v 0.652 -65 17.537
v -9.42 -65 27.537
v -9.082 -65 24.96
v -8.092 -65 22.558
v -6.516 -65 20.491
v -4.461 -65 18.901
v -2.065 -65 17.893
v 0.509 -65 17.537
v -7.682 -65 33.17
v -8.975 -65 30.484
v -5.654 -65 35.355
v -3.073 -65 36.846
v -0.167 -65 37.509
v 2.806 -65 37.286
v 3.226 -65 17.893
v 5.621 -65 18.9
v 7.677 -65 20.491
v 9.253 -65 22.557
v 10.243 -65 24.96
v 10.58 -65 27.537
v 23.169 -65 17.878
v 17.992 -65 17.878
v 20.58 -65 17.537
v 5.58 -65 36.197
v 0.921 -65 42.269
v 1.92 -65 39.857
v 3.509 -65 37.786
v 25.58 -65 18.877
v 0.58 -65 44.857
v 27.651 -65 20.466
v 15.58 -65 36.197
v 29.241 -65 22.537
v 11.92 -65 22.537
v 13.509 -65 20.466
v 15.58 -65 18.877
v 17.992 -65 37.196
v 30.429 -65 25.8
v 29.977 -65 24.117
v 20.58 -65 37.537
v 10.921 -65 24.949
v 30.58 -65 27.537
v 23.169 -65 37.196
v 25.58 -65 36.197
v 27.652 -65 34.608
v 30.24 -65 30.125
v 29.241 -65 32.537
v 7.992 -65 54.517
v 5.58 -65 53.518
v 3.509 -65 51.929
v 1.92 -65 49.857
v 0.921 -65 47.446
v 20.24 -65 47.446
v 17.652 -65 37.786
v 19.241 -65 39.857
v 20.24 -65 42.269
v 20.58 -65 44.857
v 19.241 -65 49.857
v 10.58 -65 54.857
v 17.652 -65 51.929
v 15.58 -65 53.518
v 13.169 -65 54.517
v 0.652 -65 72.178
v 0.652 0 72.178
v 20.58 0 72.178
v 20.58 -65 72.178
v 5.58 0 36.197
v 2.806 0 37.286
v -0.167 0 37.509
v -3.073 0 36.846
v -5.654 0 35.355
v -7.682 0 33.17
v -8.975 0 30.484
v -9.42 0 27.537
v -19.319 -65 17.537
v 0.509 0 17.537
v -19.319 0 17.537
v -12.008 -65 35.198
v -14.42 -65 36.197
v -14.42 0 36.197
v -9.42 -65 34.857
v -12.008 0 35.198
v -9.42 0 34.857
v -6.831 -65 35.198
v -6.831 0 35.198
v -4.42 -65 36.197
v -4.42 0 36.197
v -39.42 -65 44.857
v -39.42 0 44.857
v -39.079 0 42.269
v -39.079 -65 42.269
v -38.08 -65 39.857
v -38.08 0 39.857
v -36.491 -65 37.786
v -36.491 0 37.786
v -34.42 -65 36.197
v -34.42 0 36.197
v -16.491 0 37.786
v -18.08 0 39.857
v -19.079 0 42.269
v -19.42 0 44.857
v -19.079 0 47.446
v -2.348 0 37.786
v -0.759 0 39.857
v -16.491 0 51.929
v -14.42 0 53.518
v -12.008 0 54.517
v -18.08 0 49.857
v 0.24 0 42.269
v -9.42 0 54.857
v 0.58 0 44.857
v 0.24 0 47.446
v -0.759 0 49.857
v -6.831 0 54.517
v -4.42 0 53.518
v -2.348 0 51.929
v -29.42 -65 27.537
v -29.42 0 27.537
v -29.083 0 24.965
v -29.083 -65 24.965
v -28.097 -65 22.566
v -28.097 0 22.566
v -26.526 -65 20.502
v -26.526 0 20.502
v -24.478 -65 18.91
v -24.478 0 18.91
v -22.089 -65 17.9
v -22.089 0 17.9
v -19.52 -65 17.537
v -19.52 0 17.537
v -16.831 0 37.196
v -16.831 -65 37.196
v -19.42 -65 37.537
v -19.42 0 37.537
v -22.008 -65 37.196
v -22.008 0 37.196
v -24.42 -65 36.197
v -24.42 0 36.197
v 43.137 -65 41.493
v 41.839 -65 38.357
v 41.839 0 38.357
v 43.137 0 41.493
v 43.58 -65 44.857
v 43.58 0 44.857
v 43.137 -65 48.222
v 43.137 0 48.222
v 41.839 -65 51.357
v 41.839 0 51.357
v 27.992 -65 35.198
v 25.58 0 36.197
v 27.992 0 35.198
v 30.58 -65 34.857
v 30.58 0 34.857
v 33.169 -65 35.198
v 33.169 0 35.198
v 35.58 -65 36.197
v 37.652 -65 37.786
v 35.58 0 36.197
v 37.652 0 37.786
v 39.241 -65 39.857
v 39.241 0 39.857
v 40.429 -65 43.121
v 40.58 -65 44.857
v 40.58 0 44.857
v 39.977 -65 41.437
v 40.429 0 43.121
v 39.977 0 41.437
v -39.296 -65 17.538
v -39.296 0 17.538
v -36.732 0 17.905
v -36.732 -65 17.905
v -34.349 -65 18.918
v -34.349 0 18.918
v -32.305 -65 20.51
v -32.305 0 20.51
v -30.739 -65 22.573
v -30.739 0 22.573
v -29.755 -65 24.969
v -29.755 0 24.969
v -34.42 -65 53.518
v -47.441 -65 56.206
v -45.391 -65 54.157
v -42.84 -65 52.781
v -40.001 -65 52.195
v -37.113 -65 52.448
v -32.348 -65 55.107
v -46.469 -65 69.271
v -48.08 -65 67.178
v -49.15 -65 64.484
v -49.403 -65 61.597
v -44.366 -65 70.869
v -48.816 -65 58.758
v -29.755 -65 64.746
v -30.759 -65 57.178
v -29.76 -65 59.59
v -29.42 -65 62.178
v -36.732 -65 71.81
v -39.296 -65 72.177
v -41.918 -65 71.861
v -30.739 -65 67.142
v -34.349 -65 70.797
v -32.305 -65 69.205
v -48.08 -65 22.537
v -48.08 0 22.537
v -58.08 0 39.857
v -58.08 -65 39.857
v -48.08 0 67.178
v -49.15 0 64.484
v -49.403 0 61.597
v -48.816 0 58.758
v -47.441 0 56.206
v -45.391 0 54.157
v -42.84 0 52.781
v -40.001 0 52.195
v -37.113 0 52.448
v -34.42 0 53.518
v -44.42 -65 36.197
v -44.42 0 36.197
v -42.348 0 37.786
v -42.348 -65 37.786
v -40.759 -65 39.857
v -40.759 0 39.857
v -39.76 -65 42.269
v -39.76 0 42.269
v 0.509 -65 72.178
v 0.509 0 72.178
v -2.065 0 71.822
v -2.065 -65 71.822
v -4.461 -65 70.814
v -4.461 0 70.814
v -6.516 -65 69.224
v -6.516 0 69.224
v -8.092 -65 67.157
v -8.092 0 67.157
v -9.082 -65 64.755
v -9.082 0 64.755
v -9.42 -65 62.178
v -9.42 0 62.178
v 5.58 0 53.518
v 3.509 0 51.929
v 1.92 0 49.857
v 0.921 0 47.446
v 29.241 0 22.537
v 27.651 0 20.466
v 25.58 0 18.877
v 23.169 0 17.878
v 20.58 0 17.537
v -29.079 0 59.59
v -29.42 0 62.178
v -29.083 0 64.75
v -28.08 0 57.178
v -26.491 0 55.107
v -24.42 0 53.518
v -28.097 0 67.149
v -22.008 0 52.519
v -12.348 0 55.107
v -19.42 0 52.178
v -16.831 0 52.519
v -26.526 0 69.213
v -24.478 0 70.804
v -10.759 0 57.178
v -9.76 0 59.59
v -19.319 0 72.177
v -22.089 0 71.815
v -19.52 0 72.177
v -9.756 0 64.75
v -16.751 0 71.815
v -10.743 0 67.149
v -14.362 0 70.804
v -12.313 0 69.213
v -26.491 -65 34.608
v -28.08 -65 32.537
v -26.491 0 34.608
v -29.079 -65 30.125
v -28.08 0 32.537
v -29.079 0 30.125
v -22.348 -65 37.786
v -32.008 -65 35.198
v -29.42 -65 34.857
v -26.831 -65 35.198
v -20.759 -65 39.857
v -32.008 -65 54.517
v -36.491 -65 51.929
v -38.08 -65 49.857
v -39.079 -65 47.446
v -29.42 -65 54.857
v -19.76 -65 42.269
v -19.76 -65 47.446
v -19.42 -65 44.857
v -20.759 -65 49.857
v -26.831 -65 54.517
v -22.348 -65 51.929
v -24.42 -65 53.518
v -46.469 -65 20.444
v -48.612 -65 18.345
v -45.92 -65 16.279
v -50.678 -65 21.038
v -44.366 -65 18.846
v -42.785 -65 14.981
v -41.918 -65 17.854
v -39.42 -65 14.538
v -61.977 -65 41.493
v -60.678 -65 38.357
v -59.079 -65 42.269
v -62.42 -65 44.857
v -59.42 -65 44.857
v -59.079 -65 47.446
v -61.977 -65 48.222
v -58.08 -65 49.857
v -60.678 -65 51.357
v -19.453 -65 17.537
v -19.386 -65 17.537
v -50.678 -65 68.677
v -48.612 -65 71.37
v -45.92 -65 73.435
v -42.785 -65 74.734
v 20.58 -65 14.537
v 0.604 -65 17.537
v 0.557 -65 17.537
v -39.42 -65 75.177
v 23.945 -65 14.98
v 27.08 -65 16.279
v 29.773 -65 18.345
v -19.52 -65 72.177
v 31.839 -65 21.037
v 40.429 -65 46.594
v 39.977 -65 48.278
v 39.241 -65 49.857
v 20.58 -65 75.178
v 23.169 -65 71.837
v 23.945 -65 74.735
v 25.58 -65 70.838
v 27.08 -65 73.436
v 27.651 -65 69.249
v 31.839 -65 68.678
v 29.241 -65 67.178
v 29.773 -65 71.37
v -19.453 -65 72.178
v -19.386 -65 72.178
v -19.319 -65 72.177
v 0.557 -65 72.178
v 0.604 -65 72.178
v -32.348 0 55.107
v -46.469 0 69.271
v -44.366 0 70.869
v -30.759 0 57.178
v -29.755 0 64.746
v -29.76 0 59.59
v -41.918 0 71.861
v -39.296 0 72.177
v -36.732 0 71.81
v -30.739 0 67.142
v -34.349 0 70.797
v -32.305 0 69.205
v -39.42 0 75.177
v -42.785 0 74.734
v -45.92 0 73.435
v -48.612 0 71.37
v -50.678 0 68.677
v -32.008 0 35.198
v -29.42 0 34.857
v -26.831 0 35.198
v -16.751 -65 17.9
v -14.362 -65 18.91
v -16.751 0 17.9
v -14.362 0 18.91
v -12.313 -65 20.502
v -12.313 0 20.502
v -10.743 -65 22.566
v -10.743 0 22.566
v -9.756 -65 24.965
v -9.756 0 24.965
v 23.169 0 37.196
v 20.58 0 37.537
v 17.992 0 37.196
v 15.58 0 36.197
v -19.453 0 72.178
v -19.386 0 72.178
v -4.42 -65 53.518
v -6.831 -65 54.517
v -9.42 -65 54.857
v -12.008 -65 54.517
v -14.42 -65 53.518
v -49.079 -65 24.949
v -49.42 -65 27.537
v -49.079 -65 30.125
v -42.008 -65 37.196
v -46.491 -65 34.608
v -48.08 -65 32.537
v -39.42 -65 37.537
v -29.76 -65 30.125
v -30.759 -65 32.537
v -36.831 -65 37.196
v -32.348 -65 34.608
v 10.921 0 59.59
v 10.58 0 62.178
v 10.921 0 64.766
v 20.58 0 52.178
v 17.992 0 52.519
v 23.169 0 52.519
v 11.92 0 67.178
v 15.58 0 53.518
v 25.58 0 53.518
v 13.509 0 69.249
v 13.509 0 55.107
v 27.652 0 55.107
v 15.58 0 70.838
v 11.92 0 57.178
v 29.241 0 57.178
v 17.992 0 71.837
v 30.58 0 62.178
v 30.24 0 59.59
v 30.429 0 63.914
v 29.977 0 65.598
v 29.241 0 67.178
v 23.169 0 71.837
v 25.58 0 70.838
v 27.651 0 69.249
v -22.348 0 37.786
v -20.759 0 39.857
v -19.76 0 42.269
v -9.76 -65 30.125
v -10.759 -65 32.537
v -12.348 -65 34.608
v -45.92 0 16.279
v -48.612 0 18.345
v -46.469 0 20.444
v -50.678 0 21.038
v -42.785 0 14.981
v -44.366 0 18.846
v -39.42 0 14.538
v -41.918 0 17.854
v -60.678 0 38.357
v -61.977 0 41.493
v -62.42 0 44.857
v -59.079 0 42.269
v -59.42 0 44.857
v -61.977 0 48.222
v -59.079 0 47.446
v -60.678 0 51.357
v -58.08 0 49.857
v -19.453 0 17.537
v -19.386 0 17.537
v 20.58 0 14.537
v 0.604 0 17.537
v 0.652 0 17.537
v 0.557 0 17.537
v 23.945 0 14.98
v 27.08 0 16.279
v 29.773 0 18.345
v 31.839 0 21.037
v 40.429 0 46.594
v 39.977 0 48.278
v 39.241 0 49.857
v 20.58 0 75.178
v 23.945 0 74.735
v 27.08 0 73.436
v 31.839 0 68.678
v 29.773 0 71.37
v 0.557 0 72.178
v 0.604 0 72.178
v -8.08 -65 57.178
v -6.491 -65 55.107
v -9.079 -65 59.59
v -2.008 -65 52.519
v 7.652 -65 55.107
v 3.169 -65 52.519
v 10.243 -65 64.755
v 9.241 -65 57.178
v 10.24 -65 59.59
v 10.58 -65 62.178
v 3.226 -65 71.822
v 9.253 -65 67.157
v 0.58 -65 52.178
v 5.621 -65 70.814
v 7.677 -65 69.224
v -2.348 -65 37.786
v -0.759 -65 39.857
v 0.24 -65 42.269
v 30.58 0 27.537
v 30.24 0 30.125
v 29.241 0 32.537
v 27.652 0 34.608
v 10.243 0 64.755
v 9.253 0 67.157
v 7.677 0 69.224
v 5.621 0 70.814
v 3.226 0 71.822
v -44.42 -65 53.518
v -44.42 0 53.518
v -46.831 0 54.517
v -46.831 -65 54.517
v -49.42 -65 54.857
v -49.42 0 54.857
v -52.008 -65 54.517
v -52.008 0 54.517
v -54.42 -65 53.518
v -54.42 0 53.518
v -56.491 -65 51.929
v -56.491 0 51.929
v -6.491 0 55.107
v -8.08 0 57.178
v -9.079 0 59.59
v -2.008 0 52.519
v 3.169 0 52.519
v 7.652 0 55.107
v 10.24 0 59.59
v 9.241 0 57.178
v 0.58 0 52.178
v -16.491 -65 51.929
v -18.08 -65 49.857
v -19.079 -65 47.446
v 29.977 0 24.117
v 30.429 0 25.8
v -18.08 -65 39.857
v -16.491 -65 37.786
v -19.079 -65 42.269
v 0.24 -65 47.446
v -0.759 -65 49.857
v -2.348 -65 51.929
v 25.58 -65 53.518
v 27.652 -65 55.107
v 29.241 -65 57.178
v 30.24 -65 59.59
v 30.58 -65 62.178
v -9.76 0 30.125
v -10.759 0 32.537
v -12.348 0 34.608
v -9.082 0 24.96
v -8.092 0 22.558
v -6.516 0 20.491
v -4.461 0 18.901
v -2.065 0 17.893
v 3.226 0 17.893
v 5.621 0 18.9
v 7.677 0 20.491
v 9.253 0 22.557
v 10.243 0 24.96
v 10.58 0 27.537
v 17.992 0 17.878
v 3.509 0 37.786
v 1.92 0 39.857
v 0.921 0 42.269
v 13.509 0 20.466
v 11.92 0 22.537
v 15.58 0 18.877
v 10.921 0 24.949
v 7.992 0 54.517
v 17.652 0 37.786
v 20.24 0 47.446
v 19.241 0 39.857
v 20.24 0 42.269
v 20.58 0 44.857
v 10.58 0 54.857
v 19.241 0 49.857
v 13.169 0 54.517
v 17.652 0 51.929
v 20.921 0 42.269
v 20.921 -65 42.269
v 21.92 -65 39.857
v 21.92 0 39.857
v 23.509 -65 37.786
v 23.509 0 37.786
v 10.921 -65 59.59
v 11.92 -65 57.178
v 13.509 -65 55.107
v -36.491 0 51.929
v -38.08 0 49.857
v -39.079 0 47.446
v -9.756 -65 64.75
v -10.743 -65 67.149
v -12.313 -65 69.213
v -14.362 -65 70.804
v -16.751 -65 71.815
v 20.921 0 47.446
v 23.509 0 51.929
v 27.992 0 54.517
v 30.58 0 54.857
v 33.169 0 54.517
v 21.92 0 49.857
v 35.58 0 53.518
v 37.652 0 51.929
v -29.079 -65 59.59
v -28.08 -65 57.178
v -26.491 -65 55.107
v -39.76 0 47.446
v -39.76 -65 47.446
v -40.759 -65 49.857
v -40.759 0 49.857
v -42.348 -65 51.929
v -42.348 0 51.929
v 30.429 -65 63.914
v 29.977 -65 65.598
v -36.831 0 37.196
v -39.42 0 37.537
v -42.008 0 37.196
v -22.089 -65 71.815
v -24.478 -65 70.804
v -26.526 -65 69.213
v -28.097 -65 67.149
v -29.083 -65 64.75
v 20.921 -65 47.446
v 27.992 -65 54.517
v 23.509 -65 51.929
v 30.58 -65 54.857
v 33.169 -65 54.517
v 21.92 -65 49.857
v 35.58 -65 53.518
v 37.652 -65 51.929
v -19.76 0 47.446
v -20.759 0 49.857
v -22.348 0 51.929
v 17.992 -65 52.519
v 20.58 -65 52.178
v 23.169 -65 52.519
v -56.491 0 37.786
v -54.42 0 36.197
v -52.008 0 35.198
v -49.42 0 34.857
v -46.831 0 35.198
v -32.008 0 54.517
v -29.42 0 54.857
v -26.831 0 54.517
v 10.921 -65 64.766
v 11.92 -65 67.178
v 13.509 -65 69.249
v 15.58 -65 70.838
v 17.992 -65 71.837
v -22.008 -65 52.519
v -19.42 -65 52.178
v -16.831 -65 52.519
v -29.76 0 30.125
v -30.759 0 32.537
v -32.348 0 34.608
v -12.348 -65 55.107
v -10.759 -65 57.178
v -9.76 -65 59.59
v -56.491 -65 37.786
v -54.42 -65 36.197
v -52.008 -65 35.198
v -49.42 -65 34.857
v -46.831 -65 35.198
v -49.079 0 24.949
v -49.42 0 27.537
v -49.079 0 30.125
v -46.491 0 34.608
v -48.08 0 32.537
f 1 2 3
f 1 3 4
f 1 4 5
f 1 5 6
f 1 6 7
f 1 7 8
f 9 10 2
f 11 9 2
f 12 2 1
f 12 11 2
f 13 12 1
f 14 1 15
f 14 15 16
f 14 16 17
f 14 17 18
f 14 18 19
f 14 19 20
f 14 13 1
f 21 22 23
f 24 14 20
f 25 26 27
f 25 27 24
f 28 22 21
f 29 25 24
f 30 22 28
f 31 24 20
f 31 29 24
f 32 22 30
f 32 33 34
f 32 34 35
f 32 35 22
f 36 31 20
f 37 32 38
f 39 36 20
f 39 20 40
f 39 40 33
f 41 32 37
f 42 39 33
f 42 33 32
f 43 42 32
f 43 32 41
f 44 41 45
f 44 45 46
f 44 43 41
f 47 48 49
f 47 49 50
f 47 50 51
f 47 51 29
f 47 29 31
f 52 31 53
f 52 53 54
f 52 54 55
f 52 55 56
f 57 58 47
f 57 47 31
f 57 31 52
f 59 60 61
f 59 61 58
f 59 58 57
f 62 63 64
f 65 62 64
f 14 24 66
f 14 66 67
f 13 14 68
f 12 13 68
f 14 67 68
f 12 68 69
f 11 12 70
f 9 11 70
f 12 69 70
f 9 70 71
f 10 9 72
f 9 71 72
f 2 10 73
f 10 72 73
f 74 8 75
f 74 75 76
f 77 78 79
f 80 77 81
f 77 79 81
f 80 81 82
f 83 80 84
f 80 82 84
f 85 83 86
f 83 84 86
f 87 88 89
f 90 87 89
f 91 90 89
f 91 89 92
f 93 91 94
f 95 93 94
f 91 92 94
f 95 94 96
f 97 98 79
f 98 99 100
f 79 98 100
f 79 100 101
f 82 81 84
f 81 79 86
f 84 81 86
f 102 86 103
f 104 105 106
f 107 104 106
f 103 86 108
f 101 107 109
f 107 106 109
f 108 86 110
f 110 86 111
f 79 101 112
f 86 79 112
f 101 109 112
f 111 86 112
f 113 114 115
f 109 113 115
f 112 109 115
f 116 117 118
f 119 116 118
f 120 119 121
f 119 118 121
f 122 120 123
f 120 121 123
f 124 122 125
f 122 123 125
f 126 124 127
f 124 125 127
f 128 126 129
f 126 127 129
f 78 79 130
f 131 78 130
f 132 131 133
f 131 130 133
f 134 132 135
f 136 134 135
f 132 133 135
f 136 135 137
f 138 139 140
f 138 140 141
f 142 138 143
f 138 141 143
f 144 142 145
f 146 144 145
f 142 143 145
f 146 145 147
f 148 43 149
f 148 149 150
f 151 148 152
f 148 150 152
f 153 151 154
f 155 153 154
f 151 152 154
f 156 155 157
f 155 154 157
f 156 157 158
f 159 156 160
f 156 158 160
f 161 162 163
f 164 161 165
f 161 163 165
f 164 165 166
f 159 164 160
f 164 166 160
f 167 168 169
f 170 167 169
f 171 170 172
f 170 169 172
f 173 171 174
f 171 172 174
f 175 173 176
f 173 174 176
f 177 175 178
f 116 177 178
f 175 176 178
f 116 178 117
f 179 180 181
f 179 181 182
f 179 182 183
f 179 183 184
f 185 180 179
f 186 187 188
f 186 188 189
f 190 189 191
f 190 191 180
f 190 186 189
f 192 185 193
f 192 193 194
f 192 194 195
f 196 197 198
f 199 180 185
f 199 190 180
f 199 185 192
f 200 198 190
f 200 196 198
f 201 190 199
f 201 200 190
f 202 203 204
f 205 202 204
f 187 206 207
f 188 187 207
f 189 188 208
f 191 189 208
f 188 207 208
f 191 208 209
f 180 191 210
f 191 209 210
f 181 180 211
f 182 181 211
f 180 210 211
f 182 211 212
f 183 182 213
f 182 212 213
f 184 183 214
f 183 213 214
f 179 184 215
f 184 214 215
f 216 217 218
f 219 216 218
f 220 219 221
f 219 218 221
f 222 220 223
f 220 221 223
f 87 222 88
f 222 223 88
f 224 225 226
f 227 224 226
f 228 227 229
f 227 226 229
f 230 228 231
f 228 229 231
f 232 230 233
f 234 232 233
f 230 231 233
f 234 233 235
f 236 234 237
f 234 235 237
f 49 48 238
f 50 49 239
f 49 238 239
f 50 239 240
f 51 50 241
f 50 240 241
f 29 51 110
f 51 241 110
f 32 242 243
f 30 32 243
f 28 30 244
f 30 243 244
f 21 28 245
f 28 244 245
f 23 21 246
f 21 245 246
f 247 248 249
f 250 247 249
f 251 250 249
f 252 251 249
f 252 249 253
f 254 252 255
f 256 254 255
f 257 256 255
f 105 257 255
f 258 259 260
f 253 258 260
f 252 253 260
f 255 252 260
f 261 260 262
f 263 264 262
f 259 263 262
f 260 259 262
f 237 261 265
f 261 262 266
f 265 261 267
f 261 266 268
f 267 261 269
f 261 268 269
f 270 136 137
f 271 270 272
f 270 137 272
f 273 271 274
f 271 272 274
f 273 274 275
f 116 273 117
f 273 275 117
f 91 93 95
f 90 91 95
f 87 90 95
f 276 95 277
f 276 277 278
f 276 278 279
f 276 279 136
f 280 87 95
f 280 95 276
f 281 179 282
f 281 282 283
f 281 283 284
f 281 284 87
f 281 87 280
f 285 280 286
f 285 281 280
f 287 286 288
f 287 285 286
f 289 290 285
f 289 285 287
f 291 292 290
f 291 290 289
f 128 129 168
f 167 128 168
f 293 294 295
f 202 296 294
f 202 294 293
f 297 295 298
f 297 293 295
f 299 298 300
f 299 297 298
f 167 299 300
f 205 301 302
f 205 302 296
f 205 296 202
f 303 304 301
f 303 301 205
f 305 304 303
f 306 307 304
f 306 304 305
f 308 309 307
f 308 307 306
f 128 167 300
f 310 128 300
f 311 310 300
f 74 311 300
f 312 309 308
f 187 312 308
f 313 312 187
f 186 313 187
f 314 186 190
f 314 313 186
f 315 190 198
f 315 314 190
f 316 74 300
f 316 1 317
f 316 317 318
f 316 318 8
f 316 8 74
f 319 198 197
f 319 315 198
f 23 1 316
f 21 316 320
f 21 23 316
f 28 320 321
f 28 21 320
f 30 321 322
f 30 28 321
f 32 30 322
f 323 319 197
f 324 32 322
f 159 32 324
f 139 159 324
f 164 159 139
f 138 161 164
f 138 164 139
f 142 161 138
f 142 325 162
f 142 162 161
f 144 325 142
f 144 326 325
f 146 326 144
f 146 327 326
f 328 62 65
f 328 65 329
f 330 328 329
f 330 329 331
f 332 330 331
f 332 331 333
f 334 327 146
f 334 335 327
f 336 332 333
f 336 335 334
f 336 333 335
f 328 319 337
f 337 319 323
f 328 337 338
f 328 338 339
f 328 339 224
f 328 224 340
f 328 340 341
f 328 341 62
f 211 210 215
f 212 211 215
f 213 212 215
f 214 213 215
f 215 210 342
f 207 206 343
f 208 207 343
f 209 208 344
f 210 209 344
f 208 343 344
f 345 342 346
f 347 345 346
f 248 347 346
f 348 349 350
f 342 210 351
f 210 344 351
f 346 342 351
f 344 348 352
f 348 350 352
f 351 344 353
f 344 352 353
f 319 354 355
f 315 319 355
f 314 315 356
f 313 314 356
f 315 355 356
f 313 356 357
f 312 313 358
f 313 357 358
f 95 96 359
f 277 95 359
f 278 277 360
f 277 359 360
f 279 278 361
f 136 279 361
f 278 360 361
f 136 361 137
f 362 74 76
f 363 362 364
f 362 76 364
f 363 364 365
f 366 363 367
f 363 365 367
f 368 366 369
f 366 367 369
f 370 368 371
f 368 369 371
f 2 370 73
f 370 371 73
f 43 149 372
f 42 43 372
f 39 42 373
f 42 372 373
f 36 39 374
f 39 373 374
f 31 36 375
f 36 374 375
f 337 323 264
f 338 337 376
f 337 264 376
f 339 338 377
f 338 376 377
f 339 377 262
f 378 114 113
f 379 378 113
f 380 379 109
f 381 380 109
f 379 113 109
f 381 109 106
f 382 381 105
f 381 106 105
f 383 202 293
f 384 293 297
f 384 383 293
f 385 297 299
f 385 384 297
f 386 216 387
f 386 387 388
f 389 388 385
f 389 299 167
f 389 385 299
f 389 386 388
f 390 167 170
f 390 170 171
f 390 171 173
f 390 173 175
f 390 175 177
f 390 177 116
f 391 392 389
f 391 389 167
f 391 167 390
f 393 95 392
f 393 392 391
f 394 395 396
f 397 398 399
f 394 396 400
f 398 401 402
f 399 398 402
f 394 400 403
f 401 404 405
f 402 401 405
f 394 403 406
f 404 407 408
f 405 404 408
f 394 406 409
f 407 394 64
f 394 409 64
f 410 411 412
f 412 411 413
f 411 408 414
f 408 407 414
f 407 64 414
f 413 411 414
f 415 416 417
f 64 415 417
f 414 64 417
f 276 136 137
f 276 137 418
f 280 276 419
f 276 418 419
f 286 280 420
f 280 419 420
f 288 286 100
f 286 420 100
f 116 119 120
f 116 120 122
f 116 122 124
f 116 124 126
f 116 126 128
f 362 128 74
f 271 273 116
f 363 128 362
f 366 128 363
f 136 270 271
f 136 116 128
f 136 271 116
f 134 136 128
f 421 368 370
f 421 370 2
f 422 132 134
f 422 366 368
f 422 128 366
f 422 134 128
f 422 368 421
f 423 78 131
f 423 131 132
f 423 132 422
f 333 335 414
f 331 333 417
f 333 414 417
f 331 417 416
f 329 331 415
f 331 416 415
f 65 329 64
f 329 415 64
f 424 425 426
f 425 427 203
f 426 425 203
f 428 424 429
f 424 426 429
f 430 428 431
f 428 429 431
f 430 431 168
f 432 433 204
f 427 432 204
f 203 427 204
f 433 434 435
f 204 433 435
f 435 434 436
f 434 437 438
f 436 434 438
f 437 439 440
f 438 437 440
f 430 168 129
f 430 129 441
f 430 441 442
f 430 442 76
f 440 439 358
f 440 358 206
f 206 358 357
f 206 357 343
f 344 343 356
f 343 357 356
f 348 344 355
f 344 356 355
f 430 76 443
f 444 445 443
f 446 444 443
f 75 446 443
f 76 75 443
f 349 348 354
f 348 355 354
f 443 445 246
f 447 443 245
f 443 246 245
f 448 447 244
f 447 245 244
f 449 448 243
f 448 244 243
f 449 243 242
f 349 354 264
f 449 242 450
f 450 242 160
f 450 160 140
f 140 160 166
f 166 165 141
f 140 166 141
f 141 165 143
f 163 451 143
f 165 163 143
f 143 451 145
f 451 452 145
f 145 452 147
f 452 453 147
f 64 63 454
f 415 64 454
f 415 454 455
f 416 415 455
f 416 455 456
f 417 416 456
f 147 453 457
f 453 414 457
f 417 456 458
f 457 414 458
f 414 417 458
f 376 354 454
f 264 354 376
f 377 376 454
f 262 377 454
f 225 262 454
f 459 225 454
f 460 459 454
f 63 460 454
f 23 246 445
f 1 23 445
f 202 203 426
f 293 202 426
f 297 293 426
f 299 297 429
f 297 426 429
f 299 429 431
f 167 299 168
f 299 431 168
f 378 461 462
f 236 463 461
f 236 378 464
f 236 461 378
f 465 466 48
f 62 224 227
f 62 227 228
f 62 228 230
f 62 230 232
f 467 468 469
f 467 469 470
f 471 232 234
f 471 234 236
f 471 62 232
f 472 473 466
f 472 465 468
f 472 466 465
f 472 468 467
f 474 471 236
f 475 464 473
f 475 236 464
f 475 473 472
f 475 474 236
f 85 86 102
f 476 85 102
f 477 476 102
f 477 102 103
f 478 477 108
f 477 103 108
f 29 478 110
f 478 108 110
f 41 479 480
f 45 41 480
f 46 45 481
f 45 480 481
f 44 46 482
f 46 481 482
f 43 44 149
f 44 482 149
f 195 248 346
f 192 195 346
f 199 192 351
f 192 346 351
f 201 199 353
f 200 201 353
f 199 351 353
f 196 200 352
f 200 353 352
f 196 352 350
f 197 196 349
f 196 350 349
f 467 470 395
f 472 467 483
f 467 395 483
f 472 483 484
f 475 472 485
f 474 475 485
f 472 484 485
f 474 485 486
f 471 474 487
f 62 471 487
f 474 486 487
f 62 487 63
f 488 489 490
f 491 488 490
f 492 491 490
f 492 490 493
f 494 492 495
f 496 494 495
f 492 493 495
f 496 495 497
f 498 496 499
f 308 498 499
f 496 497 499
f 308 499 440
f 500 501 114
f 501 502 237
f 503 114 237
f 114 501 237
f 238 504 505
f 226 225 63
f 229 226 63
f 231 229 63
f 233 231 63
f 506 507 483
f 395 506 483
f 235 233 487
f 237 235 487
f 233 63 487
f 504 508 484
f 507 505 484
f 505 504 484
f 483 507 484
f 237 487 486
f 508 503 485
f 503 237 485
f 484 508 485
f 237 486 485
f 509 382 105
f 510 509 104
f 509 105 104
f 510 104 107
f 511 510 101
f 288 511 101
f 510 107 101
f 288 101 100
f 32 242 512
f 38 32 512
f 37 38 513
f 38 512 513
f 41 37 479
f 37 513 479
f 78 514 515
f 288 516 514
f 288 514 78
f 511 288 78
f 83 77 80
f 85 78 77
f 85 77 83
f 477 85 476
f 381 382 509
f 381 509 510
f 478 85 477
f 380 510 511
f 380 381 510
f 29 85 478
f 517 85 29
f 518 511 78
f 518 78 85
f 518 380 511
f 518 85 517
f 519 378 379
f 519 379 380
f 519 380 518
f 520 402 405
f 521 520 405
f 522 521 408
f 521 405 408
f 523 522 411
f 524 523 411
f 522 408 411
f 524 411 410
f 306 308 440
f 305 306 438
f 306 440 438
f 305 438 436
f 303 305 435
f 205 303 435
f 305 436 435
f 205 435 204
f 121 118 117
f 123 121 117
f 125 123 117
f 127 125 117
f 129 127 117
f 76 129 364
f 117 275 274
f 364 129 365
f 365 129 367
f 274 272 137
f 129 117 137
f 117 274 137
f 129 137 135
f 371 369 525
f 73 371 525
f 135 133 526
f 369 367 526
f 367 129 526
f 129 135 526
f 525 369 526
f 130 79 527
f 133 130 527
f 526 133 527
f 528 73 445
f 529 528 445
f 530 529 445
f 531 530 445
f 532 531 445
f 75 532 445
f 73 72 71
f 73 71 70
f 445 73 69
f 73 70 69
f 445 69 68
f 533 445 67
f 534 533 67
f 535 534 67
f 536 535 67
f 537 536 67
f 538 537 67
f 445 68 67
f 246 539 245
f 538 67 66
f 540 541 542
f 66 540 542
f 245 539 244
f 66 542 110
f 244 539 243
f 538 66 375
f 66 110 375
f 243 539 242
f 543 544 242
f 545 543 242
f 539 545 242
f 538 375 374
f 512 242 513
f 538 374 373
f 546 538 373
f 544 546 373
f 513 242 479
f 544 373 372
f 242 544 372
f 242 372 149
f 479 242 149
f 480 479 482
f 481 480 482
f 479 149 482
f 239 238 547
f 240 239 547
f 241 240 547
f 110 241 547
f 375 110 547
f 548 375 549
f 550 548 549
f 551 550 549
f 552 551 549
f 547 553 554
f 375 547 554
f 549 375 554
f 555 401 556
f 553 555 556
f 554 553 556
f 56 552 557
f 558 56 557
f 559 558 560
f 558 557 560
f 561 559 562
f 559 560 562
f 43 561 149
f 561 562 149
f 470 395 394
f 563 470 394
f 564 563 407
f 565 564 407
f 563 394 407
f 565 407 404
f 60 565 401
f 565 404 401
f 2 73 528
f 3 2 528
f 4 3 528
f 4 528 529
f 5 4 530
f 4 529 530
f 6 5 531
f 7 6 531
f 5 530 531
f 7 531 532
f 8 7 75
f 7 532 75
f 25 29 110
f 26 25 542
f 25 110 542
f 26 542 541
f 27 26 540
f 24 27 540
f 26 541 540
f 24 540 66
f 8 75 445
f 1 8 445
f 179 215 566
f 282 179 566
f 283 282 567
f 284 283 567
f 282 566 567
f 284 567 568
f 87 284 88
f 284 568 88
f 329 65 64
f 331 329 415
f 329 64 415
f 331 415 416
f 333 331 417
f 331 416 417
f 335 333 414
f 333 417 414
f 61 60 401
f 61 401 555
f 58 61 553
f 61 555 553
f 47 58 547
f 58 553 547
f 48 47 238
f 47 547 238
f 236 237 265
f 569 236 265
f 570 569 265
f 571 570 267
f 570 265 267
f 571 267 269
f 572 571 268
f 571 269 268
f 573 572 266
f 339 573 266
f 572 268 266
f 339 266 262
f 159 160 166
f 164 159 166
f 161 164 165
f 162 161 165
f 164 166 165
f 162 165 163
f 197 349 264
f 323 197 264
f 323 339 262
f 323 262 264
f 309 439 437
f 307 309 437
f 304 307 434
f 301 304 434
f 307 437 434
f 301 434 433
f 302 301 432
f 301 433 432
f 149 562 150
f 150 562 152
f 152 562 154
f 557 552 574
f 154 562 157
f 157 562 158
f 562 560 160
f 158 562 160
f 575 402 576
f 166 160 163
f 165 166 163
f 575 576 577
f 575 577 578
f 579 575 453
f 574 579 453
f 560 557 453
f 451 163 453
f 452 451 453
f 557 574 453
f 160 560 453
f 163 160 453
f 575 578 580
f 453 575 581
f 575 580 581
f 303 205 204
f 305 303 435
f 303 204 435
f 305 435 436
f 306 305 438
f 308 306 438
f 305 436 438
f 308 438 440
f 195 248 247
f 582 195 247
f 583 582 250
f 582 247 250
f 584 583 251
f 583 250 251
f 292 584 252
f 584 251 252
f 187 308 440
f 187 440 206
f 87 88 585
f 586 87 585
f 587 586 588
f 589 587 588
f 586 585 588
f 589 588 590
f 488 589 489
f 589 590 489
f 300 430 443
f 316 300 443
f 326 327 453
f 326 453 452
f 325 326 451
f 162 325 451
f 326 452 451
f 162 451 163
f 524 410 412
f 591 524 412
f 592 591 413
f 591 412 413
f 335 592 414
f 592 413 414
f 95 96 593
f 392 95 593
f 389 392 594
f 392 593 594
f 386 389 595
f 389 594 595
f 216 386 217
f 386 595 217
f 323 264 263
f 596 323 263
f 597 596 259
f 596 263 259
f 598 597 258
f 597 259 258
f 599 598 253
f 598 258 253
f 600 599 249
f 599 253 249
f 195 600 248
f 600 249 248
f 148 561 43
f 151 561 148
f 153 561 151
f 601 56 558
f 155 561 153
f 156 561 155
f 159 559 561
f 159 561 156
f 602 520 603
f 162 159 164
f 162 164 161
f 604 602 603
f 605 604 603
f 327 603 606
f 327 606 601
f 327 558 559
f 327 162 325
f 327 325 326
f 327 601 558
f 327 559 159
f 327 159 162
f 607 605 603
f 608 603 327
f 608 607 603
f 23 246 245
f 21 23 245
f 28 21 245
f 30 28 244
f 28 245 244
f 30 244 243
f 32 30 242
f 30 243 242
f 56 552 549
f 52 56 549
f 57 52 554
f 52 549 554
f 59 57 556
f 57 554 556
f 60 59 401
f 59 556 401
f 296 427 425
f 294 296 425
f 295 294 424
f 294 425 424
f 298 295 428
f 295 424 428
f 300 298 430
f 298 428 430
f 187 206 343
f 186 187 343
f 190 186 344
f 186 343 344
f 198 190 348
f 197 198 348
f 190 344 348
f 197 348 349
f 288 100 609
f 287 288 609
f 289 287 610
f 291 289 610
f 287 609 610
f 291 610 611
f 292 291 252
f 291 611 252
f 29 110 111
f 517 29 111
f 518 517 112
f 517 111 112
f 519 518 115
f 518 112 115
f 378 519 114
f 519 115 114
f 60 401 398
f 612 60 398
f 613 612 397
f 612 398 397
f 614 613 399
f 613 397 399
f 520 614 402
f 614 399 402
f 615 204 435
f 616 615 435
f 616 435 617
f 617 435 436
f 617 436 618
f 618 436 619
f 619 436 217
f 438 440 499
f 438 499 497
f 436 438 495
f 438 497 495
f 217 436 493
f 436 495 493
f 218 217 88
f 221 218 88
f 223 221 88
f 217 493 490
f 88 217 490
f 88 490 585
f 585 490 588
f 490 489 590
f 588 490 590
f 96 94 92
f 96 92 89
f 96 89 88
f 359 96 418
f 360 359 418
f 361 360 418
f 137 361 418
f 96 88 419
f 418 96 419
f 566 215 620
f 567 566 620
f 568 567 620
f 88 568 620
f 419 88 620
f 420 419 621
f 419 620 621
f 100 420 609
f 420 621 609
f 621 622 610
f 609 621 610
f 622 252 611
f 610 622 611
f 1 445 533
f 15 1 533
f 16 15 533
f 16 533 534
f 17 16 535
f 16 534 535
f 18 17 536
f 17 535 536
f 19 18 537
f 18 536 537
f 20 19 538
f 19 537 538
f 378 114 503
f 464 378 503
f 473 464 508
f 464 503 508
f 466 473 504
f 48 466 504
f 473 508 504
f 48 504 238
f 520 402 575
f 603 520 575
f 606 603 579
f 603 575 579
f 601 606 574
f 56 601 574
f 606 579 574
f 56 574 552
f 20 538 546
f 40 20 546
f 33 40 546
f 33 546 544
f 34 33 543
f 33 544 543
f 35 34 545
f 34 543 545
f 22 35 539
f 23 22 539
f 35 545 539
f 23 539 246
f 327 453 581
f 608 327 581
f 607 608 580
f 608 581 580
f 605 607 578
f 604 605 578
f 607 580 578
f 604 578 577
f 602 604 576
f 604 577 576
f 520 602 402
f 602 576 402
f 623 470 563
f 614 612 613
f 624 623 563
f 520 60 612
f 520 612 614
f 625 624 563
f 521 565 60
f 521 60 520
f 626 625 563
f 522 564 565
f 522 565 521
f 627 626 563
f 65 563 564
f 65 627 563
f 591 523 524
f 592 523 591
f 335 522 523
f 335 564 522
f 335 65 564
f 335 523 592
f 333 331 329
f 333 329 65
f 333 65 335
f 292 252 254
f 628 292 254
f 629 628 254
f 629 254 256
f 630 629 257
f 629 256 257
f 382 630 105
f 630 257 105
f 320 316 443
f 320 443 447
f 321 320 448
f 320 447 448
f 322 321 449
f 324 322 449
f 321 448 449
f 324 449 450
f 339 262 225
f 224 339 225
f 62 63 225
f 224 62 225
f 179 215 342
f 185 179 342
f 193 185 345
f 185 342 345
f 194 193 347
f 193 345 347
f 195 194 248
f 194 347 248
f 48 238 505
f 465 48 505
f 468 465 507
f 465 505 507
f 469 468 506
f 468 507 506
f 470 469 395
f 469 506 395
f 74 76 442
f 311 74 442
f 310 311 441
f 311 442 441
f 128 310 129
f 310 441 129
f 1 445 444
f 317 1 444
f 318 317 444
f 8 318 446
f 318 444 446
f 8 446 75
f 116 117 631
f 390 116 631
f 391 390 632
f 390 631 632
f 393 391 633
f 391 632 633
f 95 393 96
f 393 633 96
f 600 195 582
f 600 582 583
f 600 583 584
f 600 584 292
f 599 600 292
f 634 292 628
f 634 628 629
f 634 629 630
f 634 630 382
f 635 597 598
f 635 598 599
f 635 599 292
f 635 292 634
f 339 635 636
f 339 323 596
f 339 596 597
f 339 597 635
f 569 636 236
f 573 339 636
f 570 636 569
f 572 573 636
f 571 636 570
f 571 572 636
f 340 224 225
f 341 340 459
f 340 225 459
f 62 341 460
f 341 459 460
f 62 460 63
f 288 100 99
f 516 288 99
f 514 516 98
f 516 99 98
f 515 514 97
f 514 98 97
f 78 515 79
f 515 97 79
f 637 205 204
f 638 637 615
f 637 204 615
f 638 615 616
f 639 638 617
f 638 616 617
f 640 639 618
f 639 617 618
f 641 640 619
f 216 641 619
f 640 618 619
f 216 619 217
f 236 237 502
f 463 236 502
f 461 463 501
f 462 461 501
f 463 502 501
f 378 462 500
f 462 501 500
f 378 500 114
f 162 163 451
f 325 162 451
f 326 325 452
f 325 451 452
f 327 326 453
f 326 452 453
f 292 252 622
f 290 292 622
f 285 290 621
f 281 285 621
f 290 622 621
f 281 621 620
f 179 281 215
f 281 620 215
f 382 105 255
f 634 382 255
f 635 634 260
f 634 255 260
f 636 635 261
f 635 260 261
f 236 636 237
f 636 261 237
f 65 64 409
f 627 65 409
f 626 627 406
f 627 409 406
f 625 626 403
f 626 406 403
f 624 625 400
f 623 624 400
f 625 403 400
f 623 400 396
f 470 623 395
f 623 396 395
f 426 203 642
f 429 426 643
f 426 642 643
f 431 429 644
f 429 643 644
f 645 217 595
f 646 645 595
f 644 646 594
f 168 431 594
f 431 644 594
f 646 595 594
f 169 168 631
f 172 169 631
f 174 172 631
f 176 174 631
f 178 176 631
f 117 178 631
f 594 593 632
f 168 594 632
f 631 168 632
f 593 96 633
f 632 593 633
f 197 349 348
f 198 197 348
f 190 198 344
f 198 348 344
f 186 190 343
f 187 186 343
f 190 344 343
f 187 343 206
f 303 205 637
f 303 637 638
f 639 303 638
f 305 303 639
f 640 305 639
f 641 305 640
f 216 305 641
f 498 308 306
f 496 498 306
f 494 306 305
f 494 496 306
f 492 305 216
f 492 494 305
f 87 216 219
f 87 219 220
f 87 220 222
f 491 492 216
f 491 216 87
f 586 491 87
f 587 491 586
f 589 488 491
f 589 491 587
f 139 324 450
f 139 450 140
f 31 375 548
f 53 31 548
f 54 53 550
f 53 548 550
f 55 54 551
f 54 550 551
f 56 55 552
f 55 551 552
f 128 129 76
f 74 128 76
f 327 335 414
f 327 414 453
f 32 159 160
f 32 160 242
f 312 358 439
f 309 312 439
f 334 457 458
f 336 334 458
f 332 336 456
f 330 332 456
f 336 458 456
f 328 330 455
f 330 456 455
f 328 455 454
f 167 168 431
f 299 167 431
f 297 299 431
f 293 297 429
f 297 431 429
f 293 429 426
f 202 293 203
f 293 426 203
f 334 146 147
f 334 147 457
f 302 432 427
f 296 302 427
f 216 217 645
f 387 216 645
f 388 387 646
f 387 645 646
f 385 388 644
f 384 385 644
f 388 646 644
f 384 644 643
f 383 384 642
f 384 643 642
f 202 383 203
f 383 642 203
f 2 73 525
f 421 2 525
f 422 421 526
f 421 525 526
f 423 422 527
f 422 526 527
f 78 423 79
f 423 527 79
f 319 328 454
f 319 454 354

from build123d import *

# Parameters (mm, degrees)
F1_DEPTH = 65
F2_DEPTH = 65


with BuildPart() as f1:
    # F0 (on Front) → F1 (new body)
    with BuildSketch(Plane.XZ):
        with BuildLine():
            ThreePointArc((10.580449191, 62.1779500274), (11.9201956106, 57.1779492352), (15.5804507755, 53.5176950748))
            ThreePointArc((15.5804507755, 53.5176950748), (20.580451044, 52.1779500274), (25.580450816, 53.5176969278))
            ThreePointArc((25.580450816, 53.5176969278), (29.2407036979, 57.17795084), (30.580449191, 62.1779500274))
            ThreePointArc((30.580449191, 62.1779500274), (30.2397074539, 64.7661404784), (29.2407032288, 67.1779500274))
            ThreePointArc((29.2407032288, 67.1779500274), (25.5803943425, 70.8382357318), (20.580322524, 72.1779500266))
            ThreePointArc((20.580322524, 72.1779500266), (13.5093365957, 69.2489730556), (10.580449191, 62.1779500274))
        make_face()
    extrude(amount=F1_DEPTH)


with BuildPart() as f1b:
    # F0 (on Front) → F1, piece 2 (new body)
    with BuildSketch(Plane.XZ):
        with BuildLine():
            ThreePointArc((25.580450816, 53.5176969278), (21.9201956223, 49.8574427643), (20.580449191, 44.8574419517))
            ThreePointArc((20.580449191, 44.8574419517), (21.9201950608, 39.8574421117), (25.580448871, 36.1971880986))
            ThreePointArc((25.580448871, 36.1971880986), (33.1686394636, 35.198183641), (39.2407032288, 39.8574419517))
            ThreePointArc((39.2407032288, 39.8574419517), (40.2397074539, 42.2692515007), (40.580449191, 44.8574419517))
            ThreePointArc((40.580449191, 44.8574419517), (40.2397074539, 47.4456324028), (39.2407032288, 49.8574419517))
            ThreePointArc((39.2407032288, 49.8574419517), (33.1686405483, 54.5166999718), (25.580450816, 53.5176969278))
        make_face()
    extrude(amount=F1_DEPTH)


with BuildPart() as f1c:
    # F0 (on Front) → F1, piece 3 (new body)
    with BuildSketch(Plane.XZ):
        with BuildLine():
            ThreePointArc((25.580448871, 36.1971880986), (20.5804488945, 37.536933876), (15.5804489975, 36.1971878022))
            ThreePointArc((15.5804489975, 36.1971878022), (11.9201950973, 32.5369337793), (10.580449191, 27.536933876))
            ThreePointArc((10.580449191, 27.536933876), (13.5093365957, 20.4659108479), (20.580322524, 17.5369338768))
            ThreePointArc((20.580322524, 17.5369338768), (25.5803943425, 18.8766481716), (29.2407032288, 22.536933876))
            ThreePointArc((29.2407032288, 22.536933876), (30.2397074539, 24.948743425), (30.580449191, 27.536933876))
            ThreePointArc((30.580449191, 27.536933876), (29.2407031365, 32.536934036), (25.580448871, 36.1971880986))
        make_face()
        with BuildLine():
            ThreePointArc((5.5804475737, 53.5176950558), (1.9201946863, 49.8574411431), (0.580449191, 44.8574419517))
            ThreePointArc((0.580449191, 44.8574419517), (1.9201952644, 39.857441759), (5.5804495765, 36.1971876913))
            ThreePointArc((5.5804495765, 36.1971876913), (10.5804493018, 34.8574419517), (15.5804489975, 36.1971878022))
            ThreePointArc((15.5804489975, 36.1971878022), (19.240703173, 39.857441855), (20.580449191, 44.8574419517))
            ThreePointArc((20.580449191, 44.8574419517), (19.2407036862, 49.8574411595), (15.5804507755, 53.5176950748))
            ThreePointArc((15.5804507755, 53.5176950748), (10.5804491721, 54.8574419517), (5.5804475737, 53.5176950558))
        make_face()
        with BuildLine():
            ThreePointArc((15.5804489975, 36.1971878022), (10.5804493018, 34.8574419517), (5.5804495765, 36.1971876913))
            ThreePointArc((5.5804495765, 36.1971876913), (9.2407033401, 32.5369336833), (10.580449191, 27.536933876))
            ThreePointArc((10.580449191, 27.536933876), (11.9201950973, 32.5369337793), (15.5804489975, 36.1971878022))
        make_face()
        with BuildLine():
            ThreePointArc((5.5804495765, 36.1971876913), (0.580449328, 37.536933876), (-4.4195509572, 36.1971878283))
            ThreePointArc((-4.4195509572, 36.1971878283), (-8.0798048896, 32.536933802), (-9.419550809, 27.536933876))
            ThreePointArc((-9.419550809, 27.536933876), (-6.5157846053, 20.491121935), (0.5091423726, 17.5371881124))
            Line((0.5091423726, 17.5371881124), (0.6515026818, 17.5371863092))
            ThreePointArc((0.6515026818, 17.5371863092), (7.6765937396, 20.4910320498), (10.580449191, 27.536933876))
            ThreePointArc((10.580449191, 27.536933876), (9.2407033401, 32.5369336833), (5.5804495765, 36.1971876913))
        make_face()
    extrude(amount=F1_DEPTH)


with BuildPart() as f1d:
    # F0 (on Front) → F1, piece 4 (new body)
    with BuildSketch(Plane.XZ):
        with BuildLine():
            ThreePointArc((-9.419550809, 62.1779500274), (-8.0798043884, 57.1779492333), (-4.4195492208, 53.5176950726))
            ThreePointArc((-4.4195492208, 53.5176950726), (0.5804491742, 52.1779500274), (5.5804475737, 53.5176950558))
            ThreePointArc((5.5804475737, 53.5176950558), (9.240702762, 57.1779492188), (10.580449191, 62.1779500274))
            ThreePointArc((10.580449191, 62.1779500274), (7.6765937395, 69.2238518537), (0.6515026818, 72.1776975943))
            Line((0.6515026818, 72.1776975943), (0.5091423727, 72.1776957911))
            ThreePointArc((0.5091423727, 72.1776957911), (-6.5157846053, 69.2237619685), (-9.419550809, 62.1779500274))
        make_face()
    extrude(amount=F1_DEPTH)


with BuildPart() as f1e:
    # F0 (on Front) → F1, piece 5 (new body)
    with BuildSketch(Plane.XZ):
        with BuildLine():
            ThreePointArc((-14.4195524329, 53.517695052), (-18.0798053156, 49.8574411398), (-19.419550809, 44.8574419517))
            ThreePointArc((-19.419550809, 44.8574419517), (-18.0798047604, 39.8574418019), (-14.4195505094, 36.1971877409))
            ThreePointArc((-14.4195505094, 36.1971877409), (-9.4195507216, 34.8574419517), (-4.4195509572, 36.1971878283))
            ThreePointArc((-4.4195509572, 36.1971878283), (-0.7592968139, 39.8574418776), (0.580449191, 44.8574419517))
            ThreePointArc((0.580449191, 44.8574419517), (-0.7592963127, 49.8574411576), (-4.4195492208, 53.5176950726))
            ThreePointArc((-4.4195492208, 53.5176950726), (-9.4195508297, 54.8574419517), (-14.4195524329, 53.517695052))
        make_face()
    extrude(amount=F1_DEPTH)


with BuildPart() as f1f:
    # F0 (on Front) → F1, piece 6 (new body)
    with BuildSketch(Plane.XZ):
        with BuildLine():
            ThreePointArc((-29.419550809, 62.1779500274), (-28.0798043872, 57.1779492313), (-24.4195492167, 53.5176950703))
            ThreePointArc((-24.4195492167, 53.5176950703), (-19.4195508273, 52.1779500274), (-14.4195524329, 53.517695052))
            ThreePointArc((-14.4195524329, 53.517695052), (-10.75929724, 57.1779492155), (-9.419550809, 62.1779500274))
            ThreePointArc((-9.419550809, 62.1779500274), (-12.3130268198, 69.2133829772), (-19.3190141672, 72.1774446338))
            Line((-19.3190141672, 72.1774446338), (-19.520340772, 72.1774420837))
            ThreePointArc((-19.520340772, 72.1774420837), (-26.5261639133, 69.2132929604), (-29.419550809, 62.1779500274))
        make_face()
    extrude(amount=F1_DEPTH)


with BuildPart() as f1g:
    # F0 (on Front) → F1, piece 7 (new body)
    with BuildSketch(Plane.XZ):
        with BuildLine():
            ThreePointArc((-48.0798048469, 67.1779500274), (-49.0788093117, 59.5897604714), (-44.4195524138, 53.5176969161))
            ThreePointArc((-44.4195524138, 53.5176969161), (-39.419550809, 52.1779500274), (-34.4195492042, 53.5176969161))
            ThreePointArc((-34.4195492042, 53.5176969161), (-30.7592963079, 57.1779508298), (-29.419550809, 62.1779500274))
            ThreePointArc((-29.419550809, 62.1779500274), (-32.3050728151, 69.2053395053), (-39.2963913838, 72.1771915865))
            ThreePointArc((-39.2963913838, 72.1771915865), (-44.3661253963, 70.8688302965), (-48.0798048469, 67.1779500274))
        make_face()
    extrude(amount=F1_DEPTH)


with BuildPart() as f1h:
    # F0 (on Front) → F1, piece 8 (new body)
    with BuildSketch(Plane.XZ):
        with BuildLine():
            ThreePointArc((-34.4195492042, 53.5176969161), (-38.0798043836, 49.8574427541), (-39.419550809, 44.8574419517))
            ThreePointArc((-39.419550809, 44.8574419517), (-38.0798049203, 39.8574420789), (-34.4195510633, 36.1971880607))
            ThreePointArc((-34.4195510633, 36.1971880607), (-29.4195510999, 34.8574419517), (-24.4195510585, 36.1971877698))
            ThreePointArc((-24.4195510585, 36.1971877698), (-20.7592968432, 39.857441827), (-19.419550809, 44.8574419517))
            ThreePointArc((-19.419550809, 44.8574419517), (-20.7592963115, 49.8574411556), (-24.4195492167, 53.5176950703))
            ThreePointArc((-24.4195492167, 53.5176950703), (-29.4195489632, 54.8574419517), (-34.4195492042, 53.5176969161))
        make_face()
    extrude(amount=F1_DEPTH)


with BuildPart() as f1i:
    # F0 (on Front) → F1, piece 9 (new body)
    with BuildSketch(Plane.XZ):
        with BuildLine():
            ThreePointArc((-14.4195505094, 36.1971877409), (-19.4195507801, 37.536933876), (-24.4195510585, 36.1971877698))
            ThreePointArc((-24.4195510585, 36.1971877698), (-28.0798049189, 32.5369337513), (-29.419550809, 27.536933876))
            ThreePointArc((-29.419550809, 27.536933876), (-26.5261639134, 20.501590943), (-19.520340772, 17.5374418198))
            Line((-19.520340772, 17.5374418198), (-19.3190141671, 17.5374392696))
            ThreePointArc((-19.3190141671, 17.5374392696), (-12.3130268198, 20.5015009263), (-9.419550809, 27.536933876))
            ThreePointArc((-9.419550809, 27.536933876), (-10.7592966847, 32.5369337262), (-14.4195505094, 36.1971877409))
        make_face()
    extrude(amount=F1_DEPTH)


with BuildPart() as f1j:
    # F0 (on Front) → F1, piece 10 (new body)
    with BuildSketch(Plane.XZ):
        with BuildLine():
            ThreePointArc((-34.4195510633, 36.1971880607), (-39.4195507711, 37.536933876), (-44.4195504891, 36.1971880986))
            ThreePointArc((-44.4195504891, 36.1971880986), (-49.0788090241, 30.1251245055), (-48.0798048469, 22.536933876))
            ThreePointArc((-48.0798048469, 22.536933876), (-44.3661253963, 18.8460536069), (-39.2963913838, 17.537692317))
            ThreePointArc((-39.2963913838, 17.537692317), (-32.3050728151, 20.5095443981), (-29.419550809, 27.536933876))
            ThreePointArc((-29.419550809, 27.536933876), (-30.7592968446, 32.5369340032), (-34.4195510633, 36.1971880607))
        make_face()
    extrude(amount=F1_DEPTH)


with BuildPart() as f1k:
    # F0 (on Front) → F1, piece 11 (new body)
    with BuildSketch(Plane.XZ):
        with BuildLine():
            ThreePointArc((-44.4195524138, 53.5176969161), (-52.007742155, 54.5166999748), (-58.0798048469, 49.8574419517))
            ThreePointArc((-58.0798048469, 49.8574419517), (-59.419550809, 44.8574419517), (-58.0798048469, 39.8574419517))
            ThreePointArc((-58.0798048469, 39.8574419517), (-52.0077410816, 35.198183641), (-44.4195504891, 36.1971880986))
            ThreePointArc((-44.4195504891, 36.1971880986), (-40.7592966788, 39.8574421117), (-39.419550809, 44.8574419517))
            ThreePointArc((-39.419550809, 44.8574419517), (-40.7592972344, 49.8574427541), (-44.4195524138, 53.5176969161))
        make_face()
    extrude(amount=F1_DEPTH)


with BuildPart() as f2:
    # F0 (on Front) → F2 (new body)
    with BuildSketch(Plane.XZ):
        with BuildLine():
            Line((20.5802845239, 75.1779500264), (-39.4201542665, 75.177190019))
            ThreePointArc((-39.4201542665, 75.177190019), (-45.9200609023, 73.4354791023), (-50.6783198487, 68.6771900201))
            Line((-50.6783198487, 68.6771900201), (-60.6778810582, 51.3574419517))
            ThreePointArc((-60.6778810582, 51.3574419517), (-62.419550809, 44.8574419517), (-60.6778810582, 38.3574419517))
            Line((-60.6778810582, 38.3574419517), (-50.6783198487, 21.0376938834))
            ThreePointArc((-50.6783198487, 21.0376938834), (-45.9200609023, 16.2794048012), (-39.4201542665, 14.5376938844))
            Line((-39.4201542665, 14.5376938844), (20.5802845239, 14.5369338771))
            ThreePointArc((20.5802845239, 14.5369338771), (27.0803778879, 16.2785624603), (31.8387794402, 21.036933876))
            Line((31.8387794402, 21.036933876), (41.8387794402, 38.3574419517))
            ThreePointArc((41.8387794402, 38.3574419517), (43.580449191, 44.8574419517), (41.8387794402, 51.3574419517))
            Line((41.8387794402, 51.3574419517), (31.8387794402, 68.6779500274))
            ThreePointArc((31.8387794402, 68.6779500274), (27.0803778879, 73.4363214432), (20.5802845239, 75.1779500264))
        make_face()
        with BuildLine():
            ThreePointArc((-58.0798048469, 39.8574419517), (-59.419550809, 44.8574419517), (-58.0798048469, 49.8574419517))
            Line((-58.0798048469, 49.8574419517), (-48.0798048469, 67.1779500274))
            ThreePointArc((-48.0798048469, 67.1779500274), (-44.3661253963, 70.8688302965), (-39.2963913838, 72.1771915865))
            Line((-39.2963913838, 72.1771915865), (-19.520340772, 72.1774420837))
            ThreePointArc((-19.520340772, 72.1774420837), (-19.419677476, 72.1779500266), (-19.3190141672, 72.1774446338))
            Line((-19.3190141672, 72.1774446338), (0.5091423727, 72.1776957911))
            ThreePointArc((0.5091423727, 72.1776957911), (0.580322524, 72.1779500266), (0.6515026818, 72.1776975943))
            Line((0.6515026818, 72.1776975943), (20.580322524, 72.1779500266))
            ThreePointArc((20.580322524, 72.1779500266), (25.5803943425, 70.8382357318), (29.2407032288, 67.1779500274))
            Line((29.2407032288, 67.1779500274), (39.2407032288, 49.8574419517))
            ThreePointArc((39.2407032288, 49.8574419517), (40.2397074539, 47.4456324028), (40.580449191, 44.8574419517))
            ThreePointArc((40.580449191, 44.8574419517), (40.2397074539, 42.2692515007), (39.2407032288, 39.8574419517))
            Line((39.2407032288, 39.8574419517), (29.2407032288, 22.536933876))
            ThreePointArc((29.2407032288, 22.536933876), (25.5803943425, 18.8766481716), (20.580322524, 17.5369338768))
            Line((20.580322524, 17.5369338768), (0.6515026818, 17.5371863092))
            ThreePointArc((0.6515026818, 17.5371863092), (0.580322524, 17.5369338768), (0.5091423726, 17.5371881124))
            Line((0.5091423726, 17.5371881124), (-19.3190141671, 17.5374392696))
            ThreePointArc((-19.3190141671, 17.5374392696), (-19.419677476, 17.5369338768), (-19.520340772, 17.5374418198))
            Line((-19.520340772, 17.5374418198), (-39.2963913838, 17.537692317))
            ThreePointArc((-39.2963913838, 17.537692317), (-44.3661253963, 18.8460536069), (-48.0798048469, 22.536933876))
            Line((-48.0798048469, 22.536933876), (-58.0798048469, 39.8574419517))
        make_face(mode=Mode.SUBTRACT)
    extrude(amount=F2_DEPTH)


solid = Compound([f1.part, f1b.part, f1c.part, f1d.part, f1e.part, f1f.part, f1g.part, f1h.part, f1i.part, f1j.part, f1k.part, f2.part])
